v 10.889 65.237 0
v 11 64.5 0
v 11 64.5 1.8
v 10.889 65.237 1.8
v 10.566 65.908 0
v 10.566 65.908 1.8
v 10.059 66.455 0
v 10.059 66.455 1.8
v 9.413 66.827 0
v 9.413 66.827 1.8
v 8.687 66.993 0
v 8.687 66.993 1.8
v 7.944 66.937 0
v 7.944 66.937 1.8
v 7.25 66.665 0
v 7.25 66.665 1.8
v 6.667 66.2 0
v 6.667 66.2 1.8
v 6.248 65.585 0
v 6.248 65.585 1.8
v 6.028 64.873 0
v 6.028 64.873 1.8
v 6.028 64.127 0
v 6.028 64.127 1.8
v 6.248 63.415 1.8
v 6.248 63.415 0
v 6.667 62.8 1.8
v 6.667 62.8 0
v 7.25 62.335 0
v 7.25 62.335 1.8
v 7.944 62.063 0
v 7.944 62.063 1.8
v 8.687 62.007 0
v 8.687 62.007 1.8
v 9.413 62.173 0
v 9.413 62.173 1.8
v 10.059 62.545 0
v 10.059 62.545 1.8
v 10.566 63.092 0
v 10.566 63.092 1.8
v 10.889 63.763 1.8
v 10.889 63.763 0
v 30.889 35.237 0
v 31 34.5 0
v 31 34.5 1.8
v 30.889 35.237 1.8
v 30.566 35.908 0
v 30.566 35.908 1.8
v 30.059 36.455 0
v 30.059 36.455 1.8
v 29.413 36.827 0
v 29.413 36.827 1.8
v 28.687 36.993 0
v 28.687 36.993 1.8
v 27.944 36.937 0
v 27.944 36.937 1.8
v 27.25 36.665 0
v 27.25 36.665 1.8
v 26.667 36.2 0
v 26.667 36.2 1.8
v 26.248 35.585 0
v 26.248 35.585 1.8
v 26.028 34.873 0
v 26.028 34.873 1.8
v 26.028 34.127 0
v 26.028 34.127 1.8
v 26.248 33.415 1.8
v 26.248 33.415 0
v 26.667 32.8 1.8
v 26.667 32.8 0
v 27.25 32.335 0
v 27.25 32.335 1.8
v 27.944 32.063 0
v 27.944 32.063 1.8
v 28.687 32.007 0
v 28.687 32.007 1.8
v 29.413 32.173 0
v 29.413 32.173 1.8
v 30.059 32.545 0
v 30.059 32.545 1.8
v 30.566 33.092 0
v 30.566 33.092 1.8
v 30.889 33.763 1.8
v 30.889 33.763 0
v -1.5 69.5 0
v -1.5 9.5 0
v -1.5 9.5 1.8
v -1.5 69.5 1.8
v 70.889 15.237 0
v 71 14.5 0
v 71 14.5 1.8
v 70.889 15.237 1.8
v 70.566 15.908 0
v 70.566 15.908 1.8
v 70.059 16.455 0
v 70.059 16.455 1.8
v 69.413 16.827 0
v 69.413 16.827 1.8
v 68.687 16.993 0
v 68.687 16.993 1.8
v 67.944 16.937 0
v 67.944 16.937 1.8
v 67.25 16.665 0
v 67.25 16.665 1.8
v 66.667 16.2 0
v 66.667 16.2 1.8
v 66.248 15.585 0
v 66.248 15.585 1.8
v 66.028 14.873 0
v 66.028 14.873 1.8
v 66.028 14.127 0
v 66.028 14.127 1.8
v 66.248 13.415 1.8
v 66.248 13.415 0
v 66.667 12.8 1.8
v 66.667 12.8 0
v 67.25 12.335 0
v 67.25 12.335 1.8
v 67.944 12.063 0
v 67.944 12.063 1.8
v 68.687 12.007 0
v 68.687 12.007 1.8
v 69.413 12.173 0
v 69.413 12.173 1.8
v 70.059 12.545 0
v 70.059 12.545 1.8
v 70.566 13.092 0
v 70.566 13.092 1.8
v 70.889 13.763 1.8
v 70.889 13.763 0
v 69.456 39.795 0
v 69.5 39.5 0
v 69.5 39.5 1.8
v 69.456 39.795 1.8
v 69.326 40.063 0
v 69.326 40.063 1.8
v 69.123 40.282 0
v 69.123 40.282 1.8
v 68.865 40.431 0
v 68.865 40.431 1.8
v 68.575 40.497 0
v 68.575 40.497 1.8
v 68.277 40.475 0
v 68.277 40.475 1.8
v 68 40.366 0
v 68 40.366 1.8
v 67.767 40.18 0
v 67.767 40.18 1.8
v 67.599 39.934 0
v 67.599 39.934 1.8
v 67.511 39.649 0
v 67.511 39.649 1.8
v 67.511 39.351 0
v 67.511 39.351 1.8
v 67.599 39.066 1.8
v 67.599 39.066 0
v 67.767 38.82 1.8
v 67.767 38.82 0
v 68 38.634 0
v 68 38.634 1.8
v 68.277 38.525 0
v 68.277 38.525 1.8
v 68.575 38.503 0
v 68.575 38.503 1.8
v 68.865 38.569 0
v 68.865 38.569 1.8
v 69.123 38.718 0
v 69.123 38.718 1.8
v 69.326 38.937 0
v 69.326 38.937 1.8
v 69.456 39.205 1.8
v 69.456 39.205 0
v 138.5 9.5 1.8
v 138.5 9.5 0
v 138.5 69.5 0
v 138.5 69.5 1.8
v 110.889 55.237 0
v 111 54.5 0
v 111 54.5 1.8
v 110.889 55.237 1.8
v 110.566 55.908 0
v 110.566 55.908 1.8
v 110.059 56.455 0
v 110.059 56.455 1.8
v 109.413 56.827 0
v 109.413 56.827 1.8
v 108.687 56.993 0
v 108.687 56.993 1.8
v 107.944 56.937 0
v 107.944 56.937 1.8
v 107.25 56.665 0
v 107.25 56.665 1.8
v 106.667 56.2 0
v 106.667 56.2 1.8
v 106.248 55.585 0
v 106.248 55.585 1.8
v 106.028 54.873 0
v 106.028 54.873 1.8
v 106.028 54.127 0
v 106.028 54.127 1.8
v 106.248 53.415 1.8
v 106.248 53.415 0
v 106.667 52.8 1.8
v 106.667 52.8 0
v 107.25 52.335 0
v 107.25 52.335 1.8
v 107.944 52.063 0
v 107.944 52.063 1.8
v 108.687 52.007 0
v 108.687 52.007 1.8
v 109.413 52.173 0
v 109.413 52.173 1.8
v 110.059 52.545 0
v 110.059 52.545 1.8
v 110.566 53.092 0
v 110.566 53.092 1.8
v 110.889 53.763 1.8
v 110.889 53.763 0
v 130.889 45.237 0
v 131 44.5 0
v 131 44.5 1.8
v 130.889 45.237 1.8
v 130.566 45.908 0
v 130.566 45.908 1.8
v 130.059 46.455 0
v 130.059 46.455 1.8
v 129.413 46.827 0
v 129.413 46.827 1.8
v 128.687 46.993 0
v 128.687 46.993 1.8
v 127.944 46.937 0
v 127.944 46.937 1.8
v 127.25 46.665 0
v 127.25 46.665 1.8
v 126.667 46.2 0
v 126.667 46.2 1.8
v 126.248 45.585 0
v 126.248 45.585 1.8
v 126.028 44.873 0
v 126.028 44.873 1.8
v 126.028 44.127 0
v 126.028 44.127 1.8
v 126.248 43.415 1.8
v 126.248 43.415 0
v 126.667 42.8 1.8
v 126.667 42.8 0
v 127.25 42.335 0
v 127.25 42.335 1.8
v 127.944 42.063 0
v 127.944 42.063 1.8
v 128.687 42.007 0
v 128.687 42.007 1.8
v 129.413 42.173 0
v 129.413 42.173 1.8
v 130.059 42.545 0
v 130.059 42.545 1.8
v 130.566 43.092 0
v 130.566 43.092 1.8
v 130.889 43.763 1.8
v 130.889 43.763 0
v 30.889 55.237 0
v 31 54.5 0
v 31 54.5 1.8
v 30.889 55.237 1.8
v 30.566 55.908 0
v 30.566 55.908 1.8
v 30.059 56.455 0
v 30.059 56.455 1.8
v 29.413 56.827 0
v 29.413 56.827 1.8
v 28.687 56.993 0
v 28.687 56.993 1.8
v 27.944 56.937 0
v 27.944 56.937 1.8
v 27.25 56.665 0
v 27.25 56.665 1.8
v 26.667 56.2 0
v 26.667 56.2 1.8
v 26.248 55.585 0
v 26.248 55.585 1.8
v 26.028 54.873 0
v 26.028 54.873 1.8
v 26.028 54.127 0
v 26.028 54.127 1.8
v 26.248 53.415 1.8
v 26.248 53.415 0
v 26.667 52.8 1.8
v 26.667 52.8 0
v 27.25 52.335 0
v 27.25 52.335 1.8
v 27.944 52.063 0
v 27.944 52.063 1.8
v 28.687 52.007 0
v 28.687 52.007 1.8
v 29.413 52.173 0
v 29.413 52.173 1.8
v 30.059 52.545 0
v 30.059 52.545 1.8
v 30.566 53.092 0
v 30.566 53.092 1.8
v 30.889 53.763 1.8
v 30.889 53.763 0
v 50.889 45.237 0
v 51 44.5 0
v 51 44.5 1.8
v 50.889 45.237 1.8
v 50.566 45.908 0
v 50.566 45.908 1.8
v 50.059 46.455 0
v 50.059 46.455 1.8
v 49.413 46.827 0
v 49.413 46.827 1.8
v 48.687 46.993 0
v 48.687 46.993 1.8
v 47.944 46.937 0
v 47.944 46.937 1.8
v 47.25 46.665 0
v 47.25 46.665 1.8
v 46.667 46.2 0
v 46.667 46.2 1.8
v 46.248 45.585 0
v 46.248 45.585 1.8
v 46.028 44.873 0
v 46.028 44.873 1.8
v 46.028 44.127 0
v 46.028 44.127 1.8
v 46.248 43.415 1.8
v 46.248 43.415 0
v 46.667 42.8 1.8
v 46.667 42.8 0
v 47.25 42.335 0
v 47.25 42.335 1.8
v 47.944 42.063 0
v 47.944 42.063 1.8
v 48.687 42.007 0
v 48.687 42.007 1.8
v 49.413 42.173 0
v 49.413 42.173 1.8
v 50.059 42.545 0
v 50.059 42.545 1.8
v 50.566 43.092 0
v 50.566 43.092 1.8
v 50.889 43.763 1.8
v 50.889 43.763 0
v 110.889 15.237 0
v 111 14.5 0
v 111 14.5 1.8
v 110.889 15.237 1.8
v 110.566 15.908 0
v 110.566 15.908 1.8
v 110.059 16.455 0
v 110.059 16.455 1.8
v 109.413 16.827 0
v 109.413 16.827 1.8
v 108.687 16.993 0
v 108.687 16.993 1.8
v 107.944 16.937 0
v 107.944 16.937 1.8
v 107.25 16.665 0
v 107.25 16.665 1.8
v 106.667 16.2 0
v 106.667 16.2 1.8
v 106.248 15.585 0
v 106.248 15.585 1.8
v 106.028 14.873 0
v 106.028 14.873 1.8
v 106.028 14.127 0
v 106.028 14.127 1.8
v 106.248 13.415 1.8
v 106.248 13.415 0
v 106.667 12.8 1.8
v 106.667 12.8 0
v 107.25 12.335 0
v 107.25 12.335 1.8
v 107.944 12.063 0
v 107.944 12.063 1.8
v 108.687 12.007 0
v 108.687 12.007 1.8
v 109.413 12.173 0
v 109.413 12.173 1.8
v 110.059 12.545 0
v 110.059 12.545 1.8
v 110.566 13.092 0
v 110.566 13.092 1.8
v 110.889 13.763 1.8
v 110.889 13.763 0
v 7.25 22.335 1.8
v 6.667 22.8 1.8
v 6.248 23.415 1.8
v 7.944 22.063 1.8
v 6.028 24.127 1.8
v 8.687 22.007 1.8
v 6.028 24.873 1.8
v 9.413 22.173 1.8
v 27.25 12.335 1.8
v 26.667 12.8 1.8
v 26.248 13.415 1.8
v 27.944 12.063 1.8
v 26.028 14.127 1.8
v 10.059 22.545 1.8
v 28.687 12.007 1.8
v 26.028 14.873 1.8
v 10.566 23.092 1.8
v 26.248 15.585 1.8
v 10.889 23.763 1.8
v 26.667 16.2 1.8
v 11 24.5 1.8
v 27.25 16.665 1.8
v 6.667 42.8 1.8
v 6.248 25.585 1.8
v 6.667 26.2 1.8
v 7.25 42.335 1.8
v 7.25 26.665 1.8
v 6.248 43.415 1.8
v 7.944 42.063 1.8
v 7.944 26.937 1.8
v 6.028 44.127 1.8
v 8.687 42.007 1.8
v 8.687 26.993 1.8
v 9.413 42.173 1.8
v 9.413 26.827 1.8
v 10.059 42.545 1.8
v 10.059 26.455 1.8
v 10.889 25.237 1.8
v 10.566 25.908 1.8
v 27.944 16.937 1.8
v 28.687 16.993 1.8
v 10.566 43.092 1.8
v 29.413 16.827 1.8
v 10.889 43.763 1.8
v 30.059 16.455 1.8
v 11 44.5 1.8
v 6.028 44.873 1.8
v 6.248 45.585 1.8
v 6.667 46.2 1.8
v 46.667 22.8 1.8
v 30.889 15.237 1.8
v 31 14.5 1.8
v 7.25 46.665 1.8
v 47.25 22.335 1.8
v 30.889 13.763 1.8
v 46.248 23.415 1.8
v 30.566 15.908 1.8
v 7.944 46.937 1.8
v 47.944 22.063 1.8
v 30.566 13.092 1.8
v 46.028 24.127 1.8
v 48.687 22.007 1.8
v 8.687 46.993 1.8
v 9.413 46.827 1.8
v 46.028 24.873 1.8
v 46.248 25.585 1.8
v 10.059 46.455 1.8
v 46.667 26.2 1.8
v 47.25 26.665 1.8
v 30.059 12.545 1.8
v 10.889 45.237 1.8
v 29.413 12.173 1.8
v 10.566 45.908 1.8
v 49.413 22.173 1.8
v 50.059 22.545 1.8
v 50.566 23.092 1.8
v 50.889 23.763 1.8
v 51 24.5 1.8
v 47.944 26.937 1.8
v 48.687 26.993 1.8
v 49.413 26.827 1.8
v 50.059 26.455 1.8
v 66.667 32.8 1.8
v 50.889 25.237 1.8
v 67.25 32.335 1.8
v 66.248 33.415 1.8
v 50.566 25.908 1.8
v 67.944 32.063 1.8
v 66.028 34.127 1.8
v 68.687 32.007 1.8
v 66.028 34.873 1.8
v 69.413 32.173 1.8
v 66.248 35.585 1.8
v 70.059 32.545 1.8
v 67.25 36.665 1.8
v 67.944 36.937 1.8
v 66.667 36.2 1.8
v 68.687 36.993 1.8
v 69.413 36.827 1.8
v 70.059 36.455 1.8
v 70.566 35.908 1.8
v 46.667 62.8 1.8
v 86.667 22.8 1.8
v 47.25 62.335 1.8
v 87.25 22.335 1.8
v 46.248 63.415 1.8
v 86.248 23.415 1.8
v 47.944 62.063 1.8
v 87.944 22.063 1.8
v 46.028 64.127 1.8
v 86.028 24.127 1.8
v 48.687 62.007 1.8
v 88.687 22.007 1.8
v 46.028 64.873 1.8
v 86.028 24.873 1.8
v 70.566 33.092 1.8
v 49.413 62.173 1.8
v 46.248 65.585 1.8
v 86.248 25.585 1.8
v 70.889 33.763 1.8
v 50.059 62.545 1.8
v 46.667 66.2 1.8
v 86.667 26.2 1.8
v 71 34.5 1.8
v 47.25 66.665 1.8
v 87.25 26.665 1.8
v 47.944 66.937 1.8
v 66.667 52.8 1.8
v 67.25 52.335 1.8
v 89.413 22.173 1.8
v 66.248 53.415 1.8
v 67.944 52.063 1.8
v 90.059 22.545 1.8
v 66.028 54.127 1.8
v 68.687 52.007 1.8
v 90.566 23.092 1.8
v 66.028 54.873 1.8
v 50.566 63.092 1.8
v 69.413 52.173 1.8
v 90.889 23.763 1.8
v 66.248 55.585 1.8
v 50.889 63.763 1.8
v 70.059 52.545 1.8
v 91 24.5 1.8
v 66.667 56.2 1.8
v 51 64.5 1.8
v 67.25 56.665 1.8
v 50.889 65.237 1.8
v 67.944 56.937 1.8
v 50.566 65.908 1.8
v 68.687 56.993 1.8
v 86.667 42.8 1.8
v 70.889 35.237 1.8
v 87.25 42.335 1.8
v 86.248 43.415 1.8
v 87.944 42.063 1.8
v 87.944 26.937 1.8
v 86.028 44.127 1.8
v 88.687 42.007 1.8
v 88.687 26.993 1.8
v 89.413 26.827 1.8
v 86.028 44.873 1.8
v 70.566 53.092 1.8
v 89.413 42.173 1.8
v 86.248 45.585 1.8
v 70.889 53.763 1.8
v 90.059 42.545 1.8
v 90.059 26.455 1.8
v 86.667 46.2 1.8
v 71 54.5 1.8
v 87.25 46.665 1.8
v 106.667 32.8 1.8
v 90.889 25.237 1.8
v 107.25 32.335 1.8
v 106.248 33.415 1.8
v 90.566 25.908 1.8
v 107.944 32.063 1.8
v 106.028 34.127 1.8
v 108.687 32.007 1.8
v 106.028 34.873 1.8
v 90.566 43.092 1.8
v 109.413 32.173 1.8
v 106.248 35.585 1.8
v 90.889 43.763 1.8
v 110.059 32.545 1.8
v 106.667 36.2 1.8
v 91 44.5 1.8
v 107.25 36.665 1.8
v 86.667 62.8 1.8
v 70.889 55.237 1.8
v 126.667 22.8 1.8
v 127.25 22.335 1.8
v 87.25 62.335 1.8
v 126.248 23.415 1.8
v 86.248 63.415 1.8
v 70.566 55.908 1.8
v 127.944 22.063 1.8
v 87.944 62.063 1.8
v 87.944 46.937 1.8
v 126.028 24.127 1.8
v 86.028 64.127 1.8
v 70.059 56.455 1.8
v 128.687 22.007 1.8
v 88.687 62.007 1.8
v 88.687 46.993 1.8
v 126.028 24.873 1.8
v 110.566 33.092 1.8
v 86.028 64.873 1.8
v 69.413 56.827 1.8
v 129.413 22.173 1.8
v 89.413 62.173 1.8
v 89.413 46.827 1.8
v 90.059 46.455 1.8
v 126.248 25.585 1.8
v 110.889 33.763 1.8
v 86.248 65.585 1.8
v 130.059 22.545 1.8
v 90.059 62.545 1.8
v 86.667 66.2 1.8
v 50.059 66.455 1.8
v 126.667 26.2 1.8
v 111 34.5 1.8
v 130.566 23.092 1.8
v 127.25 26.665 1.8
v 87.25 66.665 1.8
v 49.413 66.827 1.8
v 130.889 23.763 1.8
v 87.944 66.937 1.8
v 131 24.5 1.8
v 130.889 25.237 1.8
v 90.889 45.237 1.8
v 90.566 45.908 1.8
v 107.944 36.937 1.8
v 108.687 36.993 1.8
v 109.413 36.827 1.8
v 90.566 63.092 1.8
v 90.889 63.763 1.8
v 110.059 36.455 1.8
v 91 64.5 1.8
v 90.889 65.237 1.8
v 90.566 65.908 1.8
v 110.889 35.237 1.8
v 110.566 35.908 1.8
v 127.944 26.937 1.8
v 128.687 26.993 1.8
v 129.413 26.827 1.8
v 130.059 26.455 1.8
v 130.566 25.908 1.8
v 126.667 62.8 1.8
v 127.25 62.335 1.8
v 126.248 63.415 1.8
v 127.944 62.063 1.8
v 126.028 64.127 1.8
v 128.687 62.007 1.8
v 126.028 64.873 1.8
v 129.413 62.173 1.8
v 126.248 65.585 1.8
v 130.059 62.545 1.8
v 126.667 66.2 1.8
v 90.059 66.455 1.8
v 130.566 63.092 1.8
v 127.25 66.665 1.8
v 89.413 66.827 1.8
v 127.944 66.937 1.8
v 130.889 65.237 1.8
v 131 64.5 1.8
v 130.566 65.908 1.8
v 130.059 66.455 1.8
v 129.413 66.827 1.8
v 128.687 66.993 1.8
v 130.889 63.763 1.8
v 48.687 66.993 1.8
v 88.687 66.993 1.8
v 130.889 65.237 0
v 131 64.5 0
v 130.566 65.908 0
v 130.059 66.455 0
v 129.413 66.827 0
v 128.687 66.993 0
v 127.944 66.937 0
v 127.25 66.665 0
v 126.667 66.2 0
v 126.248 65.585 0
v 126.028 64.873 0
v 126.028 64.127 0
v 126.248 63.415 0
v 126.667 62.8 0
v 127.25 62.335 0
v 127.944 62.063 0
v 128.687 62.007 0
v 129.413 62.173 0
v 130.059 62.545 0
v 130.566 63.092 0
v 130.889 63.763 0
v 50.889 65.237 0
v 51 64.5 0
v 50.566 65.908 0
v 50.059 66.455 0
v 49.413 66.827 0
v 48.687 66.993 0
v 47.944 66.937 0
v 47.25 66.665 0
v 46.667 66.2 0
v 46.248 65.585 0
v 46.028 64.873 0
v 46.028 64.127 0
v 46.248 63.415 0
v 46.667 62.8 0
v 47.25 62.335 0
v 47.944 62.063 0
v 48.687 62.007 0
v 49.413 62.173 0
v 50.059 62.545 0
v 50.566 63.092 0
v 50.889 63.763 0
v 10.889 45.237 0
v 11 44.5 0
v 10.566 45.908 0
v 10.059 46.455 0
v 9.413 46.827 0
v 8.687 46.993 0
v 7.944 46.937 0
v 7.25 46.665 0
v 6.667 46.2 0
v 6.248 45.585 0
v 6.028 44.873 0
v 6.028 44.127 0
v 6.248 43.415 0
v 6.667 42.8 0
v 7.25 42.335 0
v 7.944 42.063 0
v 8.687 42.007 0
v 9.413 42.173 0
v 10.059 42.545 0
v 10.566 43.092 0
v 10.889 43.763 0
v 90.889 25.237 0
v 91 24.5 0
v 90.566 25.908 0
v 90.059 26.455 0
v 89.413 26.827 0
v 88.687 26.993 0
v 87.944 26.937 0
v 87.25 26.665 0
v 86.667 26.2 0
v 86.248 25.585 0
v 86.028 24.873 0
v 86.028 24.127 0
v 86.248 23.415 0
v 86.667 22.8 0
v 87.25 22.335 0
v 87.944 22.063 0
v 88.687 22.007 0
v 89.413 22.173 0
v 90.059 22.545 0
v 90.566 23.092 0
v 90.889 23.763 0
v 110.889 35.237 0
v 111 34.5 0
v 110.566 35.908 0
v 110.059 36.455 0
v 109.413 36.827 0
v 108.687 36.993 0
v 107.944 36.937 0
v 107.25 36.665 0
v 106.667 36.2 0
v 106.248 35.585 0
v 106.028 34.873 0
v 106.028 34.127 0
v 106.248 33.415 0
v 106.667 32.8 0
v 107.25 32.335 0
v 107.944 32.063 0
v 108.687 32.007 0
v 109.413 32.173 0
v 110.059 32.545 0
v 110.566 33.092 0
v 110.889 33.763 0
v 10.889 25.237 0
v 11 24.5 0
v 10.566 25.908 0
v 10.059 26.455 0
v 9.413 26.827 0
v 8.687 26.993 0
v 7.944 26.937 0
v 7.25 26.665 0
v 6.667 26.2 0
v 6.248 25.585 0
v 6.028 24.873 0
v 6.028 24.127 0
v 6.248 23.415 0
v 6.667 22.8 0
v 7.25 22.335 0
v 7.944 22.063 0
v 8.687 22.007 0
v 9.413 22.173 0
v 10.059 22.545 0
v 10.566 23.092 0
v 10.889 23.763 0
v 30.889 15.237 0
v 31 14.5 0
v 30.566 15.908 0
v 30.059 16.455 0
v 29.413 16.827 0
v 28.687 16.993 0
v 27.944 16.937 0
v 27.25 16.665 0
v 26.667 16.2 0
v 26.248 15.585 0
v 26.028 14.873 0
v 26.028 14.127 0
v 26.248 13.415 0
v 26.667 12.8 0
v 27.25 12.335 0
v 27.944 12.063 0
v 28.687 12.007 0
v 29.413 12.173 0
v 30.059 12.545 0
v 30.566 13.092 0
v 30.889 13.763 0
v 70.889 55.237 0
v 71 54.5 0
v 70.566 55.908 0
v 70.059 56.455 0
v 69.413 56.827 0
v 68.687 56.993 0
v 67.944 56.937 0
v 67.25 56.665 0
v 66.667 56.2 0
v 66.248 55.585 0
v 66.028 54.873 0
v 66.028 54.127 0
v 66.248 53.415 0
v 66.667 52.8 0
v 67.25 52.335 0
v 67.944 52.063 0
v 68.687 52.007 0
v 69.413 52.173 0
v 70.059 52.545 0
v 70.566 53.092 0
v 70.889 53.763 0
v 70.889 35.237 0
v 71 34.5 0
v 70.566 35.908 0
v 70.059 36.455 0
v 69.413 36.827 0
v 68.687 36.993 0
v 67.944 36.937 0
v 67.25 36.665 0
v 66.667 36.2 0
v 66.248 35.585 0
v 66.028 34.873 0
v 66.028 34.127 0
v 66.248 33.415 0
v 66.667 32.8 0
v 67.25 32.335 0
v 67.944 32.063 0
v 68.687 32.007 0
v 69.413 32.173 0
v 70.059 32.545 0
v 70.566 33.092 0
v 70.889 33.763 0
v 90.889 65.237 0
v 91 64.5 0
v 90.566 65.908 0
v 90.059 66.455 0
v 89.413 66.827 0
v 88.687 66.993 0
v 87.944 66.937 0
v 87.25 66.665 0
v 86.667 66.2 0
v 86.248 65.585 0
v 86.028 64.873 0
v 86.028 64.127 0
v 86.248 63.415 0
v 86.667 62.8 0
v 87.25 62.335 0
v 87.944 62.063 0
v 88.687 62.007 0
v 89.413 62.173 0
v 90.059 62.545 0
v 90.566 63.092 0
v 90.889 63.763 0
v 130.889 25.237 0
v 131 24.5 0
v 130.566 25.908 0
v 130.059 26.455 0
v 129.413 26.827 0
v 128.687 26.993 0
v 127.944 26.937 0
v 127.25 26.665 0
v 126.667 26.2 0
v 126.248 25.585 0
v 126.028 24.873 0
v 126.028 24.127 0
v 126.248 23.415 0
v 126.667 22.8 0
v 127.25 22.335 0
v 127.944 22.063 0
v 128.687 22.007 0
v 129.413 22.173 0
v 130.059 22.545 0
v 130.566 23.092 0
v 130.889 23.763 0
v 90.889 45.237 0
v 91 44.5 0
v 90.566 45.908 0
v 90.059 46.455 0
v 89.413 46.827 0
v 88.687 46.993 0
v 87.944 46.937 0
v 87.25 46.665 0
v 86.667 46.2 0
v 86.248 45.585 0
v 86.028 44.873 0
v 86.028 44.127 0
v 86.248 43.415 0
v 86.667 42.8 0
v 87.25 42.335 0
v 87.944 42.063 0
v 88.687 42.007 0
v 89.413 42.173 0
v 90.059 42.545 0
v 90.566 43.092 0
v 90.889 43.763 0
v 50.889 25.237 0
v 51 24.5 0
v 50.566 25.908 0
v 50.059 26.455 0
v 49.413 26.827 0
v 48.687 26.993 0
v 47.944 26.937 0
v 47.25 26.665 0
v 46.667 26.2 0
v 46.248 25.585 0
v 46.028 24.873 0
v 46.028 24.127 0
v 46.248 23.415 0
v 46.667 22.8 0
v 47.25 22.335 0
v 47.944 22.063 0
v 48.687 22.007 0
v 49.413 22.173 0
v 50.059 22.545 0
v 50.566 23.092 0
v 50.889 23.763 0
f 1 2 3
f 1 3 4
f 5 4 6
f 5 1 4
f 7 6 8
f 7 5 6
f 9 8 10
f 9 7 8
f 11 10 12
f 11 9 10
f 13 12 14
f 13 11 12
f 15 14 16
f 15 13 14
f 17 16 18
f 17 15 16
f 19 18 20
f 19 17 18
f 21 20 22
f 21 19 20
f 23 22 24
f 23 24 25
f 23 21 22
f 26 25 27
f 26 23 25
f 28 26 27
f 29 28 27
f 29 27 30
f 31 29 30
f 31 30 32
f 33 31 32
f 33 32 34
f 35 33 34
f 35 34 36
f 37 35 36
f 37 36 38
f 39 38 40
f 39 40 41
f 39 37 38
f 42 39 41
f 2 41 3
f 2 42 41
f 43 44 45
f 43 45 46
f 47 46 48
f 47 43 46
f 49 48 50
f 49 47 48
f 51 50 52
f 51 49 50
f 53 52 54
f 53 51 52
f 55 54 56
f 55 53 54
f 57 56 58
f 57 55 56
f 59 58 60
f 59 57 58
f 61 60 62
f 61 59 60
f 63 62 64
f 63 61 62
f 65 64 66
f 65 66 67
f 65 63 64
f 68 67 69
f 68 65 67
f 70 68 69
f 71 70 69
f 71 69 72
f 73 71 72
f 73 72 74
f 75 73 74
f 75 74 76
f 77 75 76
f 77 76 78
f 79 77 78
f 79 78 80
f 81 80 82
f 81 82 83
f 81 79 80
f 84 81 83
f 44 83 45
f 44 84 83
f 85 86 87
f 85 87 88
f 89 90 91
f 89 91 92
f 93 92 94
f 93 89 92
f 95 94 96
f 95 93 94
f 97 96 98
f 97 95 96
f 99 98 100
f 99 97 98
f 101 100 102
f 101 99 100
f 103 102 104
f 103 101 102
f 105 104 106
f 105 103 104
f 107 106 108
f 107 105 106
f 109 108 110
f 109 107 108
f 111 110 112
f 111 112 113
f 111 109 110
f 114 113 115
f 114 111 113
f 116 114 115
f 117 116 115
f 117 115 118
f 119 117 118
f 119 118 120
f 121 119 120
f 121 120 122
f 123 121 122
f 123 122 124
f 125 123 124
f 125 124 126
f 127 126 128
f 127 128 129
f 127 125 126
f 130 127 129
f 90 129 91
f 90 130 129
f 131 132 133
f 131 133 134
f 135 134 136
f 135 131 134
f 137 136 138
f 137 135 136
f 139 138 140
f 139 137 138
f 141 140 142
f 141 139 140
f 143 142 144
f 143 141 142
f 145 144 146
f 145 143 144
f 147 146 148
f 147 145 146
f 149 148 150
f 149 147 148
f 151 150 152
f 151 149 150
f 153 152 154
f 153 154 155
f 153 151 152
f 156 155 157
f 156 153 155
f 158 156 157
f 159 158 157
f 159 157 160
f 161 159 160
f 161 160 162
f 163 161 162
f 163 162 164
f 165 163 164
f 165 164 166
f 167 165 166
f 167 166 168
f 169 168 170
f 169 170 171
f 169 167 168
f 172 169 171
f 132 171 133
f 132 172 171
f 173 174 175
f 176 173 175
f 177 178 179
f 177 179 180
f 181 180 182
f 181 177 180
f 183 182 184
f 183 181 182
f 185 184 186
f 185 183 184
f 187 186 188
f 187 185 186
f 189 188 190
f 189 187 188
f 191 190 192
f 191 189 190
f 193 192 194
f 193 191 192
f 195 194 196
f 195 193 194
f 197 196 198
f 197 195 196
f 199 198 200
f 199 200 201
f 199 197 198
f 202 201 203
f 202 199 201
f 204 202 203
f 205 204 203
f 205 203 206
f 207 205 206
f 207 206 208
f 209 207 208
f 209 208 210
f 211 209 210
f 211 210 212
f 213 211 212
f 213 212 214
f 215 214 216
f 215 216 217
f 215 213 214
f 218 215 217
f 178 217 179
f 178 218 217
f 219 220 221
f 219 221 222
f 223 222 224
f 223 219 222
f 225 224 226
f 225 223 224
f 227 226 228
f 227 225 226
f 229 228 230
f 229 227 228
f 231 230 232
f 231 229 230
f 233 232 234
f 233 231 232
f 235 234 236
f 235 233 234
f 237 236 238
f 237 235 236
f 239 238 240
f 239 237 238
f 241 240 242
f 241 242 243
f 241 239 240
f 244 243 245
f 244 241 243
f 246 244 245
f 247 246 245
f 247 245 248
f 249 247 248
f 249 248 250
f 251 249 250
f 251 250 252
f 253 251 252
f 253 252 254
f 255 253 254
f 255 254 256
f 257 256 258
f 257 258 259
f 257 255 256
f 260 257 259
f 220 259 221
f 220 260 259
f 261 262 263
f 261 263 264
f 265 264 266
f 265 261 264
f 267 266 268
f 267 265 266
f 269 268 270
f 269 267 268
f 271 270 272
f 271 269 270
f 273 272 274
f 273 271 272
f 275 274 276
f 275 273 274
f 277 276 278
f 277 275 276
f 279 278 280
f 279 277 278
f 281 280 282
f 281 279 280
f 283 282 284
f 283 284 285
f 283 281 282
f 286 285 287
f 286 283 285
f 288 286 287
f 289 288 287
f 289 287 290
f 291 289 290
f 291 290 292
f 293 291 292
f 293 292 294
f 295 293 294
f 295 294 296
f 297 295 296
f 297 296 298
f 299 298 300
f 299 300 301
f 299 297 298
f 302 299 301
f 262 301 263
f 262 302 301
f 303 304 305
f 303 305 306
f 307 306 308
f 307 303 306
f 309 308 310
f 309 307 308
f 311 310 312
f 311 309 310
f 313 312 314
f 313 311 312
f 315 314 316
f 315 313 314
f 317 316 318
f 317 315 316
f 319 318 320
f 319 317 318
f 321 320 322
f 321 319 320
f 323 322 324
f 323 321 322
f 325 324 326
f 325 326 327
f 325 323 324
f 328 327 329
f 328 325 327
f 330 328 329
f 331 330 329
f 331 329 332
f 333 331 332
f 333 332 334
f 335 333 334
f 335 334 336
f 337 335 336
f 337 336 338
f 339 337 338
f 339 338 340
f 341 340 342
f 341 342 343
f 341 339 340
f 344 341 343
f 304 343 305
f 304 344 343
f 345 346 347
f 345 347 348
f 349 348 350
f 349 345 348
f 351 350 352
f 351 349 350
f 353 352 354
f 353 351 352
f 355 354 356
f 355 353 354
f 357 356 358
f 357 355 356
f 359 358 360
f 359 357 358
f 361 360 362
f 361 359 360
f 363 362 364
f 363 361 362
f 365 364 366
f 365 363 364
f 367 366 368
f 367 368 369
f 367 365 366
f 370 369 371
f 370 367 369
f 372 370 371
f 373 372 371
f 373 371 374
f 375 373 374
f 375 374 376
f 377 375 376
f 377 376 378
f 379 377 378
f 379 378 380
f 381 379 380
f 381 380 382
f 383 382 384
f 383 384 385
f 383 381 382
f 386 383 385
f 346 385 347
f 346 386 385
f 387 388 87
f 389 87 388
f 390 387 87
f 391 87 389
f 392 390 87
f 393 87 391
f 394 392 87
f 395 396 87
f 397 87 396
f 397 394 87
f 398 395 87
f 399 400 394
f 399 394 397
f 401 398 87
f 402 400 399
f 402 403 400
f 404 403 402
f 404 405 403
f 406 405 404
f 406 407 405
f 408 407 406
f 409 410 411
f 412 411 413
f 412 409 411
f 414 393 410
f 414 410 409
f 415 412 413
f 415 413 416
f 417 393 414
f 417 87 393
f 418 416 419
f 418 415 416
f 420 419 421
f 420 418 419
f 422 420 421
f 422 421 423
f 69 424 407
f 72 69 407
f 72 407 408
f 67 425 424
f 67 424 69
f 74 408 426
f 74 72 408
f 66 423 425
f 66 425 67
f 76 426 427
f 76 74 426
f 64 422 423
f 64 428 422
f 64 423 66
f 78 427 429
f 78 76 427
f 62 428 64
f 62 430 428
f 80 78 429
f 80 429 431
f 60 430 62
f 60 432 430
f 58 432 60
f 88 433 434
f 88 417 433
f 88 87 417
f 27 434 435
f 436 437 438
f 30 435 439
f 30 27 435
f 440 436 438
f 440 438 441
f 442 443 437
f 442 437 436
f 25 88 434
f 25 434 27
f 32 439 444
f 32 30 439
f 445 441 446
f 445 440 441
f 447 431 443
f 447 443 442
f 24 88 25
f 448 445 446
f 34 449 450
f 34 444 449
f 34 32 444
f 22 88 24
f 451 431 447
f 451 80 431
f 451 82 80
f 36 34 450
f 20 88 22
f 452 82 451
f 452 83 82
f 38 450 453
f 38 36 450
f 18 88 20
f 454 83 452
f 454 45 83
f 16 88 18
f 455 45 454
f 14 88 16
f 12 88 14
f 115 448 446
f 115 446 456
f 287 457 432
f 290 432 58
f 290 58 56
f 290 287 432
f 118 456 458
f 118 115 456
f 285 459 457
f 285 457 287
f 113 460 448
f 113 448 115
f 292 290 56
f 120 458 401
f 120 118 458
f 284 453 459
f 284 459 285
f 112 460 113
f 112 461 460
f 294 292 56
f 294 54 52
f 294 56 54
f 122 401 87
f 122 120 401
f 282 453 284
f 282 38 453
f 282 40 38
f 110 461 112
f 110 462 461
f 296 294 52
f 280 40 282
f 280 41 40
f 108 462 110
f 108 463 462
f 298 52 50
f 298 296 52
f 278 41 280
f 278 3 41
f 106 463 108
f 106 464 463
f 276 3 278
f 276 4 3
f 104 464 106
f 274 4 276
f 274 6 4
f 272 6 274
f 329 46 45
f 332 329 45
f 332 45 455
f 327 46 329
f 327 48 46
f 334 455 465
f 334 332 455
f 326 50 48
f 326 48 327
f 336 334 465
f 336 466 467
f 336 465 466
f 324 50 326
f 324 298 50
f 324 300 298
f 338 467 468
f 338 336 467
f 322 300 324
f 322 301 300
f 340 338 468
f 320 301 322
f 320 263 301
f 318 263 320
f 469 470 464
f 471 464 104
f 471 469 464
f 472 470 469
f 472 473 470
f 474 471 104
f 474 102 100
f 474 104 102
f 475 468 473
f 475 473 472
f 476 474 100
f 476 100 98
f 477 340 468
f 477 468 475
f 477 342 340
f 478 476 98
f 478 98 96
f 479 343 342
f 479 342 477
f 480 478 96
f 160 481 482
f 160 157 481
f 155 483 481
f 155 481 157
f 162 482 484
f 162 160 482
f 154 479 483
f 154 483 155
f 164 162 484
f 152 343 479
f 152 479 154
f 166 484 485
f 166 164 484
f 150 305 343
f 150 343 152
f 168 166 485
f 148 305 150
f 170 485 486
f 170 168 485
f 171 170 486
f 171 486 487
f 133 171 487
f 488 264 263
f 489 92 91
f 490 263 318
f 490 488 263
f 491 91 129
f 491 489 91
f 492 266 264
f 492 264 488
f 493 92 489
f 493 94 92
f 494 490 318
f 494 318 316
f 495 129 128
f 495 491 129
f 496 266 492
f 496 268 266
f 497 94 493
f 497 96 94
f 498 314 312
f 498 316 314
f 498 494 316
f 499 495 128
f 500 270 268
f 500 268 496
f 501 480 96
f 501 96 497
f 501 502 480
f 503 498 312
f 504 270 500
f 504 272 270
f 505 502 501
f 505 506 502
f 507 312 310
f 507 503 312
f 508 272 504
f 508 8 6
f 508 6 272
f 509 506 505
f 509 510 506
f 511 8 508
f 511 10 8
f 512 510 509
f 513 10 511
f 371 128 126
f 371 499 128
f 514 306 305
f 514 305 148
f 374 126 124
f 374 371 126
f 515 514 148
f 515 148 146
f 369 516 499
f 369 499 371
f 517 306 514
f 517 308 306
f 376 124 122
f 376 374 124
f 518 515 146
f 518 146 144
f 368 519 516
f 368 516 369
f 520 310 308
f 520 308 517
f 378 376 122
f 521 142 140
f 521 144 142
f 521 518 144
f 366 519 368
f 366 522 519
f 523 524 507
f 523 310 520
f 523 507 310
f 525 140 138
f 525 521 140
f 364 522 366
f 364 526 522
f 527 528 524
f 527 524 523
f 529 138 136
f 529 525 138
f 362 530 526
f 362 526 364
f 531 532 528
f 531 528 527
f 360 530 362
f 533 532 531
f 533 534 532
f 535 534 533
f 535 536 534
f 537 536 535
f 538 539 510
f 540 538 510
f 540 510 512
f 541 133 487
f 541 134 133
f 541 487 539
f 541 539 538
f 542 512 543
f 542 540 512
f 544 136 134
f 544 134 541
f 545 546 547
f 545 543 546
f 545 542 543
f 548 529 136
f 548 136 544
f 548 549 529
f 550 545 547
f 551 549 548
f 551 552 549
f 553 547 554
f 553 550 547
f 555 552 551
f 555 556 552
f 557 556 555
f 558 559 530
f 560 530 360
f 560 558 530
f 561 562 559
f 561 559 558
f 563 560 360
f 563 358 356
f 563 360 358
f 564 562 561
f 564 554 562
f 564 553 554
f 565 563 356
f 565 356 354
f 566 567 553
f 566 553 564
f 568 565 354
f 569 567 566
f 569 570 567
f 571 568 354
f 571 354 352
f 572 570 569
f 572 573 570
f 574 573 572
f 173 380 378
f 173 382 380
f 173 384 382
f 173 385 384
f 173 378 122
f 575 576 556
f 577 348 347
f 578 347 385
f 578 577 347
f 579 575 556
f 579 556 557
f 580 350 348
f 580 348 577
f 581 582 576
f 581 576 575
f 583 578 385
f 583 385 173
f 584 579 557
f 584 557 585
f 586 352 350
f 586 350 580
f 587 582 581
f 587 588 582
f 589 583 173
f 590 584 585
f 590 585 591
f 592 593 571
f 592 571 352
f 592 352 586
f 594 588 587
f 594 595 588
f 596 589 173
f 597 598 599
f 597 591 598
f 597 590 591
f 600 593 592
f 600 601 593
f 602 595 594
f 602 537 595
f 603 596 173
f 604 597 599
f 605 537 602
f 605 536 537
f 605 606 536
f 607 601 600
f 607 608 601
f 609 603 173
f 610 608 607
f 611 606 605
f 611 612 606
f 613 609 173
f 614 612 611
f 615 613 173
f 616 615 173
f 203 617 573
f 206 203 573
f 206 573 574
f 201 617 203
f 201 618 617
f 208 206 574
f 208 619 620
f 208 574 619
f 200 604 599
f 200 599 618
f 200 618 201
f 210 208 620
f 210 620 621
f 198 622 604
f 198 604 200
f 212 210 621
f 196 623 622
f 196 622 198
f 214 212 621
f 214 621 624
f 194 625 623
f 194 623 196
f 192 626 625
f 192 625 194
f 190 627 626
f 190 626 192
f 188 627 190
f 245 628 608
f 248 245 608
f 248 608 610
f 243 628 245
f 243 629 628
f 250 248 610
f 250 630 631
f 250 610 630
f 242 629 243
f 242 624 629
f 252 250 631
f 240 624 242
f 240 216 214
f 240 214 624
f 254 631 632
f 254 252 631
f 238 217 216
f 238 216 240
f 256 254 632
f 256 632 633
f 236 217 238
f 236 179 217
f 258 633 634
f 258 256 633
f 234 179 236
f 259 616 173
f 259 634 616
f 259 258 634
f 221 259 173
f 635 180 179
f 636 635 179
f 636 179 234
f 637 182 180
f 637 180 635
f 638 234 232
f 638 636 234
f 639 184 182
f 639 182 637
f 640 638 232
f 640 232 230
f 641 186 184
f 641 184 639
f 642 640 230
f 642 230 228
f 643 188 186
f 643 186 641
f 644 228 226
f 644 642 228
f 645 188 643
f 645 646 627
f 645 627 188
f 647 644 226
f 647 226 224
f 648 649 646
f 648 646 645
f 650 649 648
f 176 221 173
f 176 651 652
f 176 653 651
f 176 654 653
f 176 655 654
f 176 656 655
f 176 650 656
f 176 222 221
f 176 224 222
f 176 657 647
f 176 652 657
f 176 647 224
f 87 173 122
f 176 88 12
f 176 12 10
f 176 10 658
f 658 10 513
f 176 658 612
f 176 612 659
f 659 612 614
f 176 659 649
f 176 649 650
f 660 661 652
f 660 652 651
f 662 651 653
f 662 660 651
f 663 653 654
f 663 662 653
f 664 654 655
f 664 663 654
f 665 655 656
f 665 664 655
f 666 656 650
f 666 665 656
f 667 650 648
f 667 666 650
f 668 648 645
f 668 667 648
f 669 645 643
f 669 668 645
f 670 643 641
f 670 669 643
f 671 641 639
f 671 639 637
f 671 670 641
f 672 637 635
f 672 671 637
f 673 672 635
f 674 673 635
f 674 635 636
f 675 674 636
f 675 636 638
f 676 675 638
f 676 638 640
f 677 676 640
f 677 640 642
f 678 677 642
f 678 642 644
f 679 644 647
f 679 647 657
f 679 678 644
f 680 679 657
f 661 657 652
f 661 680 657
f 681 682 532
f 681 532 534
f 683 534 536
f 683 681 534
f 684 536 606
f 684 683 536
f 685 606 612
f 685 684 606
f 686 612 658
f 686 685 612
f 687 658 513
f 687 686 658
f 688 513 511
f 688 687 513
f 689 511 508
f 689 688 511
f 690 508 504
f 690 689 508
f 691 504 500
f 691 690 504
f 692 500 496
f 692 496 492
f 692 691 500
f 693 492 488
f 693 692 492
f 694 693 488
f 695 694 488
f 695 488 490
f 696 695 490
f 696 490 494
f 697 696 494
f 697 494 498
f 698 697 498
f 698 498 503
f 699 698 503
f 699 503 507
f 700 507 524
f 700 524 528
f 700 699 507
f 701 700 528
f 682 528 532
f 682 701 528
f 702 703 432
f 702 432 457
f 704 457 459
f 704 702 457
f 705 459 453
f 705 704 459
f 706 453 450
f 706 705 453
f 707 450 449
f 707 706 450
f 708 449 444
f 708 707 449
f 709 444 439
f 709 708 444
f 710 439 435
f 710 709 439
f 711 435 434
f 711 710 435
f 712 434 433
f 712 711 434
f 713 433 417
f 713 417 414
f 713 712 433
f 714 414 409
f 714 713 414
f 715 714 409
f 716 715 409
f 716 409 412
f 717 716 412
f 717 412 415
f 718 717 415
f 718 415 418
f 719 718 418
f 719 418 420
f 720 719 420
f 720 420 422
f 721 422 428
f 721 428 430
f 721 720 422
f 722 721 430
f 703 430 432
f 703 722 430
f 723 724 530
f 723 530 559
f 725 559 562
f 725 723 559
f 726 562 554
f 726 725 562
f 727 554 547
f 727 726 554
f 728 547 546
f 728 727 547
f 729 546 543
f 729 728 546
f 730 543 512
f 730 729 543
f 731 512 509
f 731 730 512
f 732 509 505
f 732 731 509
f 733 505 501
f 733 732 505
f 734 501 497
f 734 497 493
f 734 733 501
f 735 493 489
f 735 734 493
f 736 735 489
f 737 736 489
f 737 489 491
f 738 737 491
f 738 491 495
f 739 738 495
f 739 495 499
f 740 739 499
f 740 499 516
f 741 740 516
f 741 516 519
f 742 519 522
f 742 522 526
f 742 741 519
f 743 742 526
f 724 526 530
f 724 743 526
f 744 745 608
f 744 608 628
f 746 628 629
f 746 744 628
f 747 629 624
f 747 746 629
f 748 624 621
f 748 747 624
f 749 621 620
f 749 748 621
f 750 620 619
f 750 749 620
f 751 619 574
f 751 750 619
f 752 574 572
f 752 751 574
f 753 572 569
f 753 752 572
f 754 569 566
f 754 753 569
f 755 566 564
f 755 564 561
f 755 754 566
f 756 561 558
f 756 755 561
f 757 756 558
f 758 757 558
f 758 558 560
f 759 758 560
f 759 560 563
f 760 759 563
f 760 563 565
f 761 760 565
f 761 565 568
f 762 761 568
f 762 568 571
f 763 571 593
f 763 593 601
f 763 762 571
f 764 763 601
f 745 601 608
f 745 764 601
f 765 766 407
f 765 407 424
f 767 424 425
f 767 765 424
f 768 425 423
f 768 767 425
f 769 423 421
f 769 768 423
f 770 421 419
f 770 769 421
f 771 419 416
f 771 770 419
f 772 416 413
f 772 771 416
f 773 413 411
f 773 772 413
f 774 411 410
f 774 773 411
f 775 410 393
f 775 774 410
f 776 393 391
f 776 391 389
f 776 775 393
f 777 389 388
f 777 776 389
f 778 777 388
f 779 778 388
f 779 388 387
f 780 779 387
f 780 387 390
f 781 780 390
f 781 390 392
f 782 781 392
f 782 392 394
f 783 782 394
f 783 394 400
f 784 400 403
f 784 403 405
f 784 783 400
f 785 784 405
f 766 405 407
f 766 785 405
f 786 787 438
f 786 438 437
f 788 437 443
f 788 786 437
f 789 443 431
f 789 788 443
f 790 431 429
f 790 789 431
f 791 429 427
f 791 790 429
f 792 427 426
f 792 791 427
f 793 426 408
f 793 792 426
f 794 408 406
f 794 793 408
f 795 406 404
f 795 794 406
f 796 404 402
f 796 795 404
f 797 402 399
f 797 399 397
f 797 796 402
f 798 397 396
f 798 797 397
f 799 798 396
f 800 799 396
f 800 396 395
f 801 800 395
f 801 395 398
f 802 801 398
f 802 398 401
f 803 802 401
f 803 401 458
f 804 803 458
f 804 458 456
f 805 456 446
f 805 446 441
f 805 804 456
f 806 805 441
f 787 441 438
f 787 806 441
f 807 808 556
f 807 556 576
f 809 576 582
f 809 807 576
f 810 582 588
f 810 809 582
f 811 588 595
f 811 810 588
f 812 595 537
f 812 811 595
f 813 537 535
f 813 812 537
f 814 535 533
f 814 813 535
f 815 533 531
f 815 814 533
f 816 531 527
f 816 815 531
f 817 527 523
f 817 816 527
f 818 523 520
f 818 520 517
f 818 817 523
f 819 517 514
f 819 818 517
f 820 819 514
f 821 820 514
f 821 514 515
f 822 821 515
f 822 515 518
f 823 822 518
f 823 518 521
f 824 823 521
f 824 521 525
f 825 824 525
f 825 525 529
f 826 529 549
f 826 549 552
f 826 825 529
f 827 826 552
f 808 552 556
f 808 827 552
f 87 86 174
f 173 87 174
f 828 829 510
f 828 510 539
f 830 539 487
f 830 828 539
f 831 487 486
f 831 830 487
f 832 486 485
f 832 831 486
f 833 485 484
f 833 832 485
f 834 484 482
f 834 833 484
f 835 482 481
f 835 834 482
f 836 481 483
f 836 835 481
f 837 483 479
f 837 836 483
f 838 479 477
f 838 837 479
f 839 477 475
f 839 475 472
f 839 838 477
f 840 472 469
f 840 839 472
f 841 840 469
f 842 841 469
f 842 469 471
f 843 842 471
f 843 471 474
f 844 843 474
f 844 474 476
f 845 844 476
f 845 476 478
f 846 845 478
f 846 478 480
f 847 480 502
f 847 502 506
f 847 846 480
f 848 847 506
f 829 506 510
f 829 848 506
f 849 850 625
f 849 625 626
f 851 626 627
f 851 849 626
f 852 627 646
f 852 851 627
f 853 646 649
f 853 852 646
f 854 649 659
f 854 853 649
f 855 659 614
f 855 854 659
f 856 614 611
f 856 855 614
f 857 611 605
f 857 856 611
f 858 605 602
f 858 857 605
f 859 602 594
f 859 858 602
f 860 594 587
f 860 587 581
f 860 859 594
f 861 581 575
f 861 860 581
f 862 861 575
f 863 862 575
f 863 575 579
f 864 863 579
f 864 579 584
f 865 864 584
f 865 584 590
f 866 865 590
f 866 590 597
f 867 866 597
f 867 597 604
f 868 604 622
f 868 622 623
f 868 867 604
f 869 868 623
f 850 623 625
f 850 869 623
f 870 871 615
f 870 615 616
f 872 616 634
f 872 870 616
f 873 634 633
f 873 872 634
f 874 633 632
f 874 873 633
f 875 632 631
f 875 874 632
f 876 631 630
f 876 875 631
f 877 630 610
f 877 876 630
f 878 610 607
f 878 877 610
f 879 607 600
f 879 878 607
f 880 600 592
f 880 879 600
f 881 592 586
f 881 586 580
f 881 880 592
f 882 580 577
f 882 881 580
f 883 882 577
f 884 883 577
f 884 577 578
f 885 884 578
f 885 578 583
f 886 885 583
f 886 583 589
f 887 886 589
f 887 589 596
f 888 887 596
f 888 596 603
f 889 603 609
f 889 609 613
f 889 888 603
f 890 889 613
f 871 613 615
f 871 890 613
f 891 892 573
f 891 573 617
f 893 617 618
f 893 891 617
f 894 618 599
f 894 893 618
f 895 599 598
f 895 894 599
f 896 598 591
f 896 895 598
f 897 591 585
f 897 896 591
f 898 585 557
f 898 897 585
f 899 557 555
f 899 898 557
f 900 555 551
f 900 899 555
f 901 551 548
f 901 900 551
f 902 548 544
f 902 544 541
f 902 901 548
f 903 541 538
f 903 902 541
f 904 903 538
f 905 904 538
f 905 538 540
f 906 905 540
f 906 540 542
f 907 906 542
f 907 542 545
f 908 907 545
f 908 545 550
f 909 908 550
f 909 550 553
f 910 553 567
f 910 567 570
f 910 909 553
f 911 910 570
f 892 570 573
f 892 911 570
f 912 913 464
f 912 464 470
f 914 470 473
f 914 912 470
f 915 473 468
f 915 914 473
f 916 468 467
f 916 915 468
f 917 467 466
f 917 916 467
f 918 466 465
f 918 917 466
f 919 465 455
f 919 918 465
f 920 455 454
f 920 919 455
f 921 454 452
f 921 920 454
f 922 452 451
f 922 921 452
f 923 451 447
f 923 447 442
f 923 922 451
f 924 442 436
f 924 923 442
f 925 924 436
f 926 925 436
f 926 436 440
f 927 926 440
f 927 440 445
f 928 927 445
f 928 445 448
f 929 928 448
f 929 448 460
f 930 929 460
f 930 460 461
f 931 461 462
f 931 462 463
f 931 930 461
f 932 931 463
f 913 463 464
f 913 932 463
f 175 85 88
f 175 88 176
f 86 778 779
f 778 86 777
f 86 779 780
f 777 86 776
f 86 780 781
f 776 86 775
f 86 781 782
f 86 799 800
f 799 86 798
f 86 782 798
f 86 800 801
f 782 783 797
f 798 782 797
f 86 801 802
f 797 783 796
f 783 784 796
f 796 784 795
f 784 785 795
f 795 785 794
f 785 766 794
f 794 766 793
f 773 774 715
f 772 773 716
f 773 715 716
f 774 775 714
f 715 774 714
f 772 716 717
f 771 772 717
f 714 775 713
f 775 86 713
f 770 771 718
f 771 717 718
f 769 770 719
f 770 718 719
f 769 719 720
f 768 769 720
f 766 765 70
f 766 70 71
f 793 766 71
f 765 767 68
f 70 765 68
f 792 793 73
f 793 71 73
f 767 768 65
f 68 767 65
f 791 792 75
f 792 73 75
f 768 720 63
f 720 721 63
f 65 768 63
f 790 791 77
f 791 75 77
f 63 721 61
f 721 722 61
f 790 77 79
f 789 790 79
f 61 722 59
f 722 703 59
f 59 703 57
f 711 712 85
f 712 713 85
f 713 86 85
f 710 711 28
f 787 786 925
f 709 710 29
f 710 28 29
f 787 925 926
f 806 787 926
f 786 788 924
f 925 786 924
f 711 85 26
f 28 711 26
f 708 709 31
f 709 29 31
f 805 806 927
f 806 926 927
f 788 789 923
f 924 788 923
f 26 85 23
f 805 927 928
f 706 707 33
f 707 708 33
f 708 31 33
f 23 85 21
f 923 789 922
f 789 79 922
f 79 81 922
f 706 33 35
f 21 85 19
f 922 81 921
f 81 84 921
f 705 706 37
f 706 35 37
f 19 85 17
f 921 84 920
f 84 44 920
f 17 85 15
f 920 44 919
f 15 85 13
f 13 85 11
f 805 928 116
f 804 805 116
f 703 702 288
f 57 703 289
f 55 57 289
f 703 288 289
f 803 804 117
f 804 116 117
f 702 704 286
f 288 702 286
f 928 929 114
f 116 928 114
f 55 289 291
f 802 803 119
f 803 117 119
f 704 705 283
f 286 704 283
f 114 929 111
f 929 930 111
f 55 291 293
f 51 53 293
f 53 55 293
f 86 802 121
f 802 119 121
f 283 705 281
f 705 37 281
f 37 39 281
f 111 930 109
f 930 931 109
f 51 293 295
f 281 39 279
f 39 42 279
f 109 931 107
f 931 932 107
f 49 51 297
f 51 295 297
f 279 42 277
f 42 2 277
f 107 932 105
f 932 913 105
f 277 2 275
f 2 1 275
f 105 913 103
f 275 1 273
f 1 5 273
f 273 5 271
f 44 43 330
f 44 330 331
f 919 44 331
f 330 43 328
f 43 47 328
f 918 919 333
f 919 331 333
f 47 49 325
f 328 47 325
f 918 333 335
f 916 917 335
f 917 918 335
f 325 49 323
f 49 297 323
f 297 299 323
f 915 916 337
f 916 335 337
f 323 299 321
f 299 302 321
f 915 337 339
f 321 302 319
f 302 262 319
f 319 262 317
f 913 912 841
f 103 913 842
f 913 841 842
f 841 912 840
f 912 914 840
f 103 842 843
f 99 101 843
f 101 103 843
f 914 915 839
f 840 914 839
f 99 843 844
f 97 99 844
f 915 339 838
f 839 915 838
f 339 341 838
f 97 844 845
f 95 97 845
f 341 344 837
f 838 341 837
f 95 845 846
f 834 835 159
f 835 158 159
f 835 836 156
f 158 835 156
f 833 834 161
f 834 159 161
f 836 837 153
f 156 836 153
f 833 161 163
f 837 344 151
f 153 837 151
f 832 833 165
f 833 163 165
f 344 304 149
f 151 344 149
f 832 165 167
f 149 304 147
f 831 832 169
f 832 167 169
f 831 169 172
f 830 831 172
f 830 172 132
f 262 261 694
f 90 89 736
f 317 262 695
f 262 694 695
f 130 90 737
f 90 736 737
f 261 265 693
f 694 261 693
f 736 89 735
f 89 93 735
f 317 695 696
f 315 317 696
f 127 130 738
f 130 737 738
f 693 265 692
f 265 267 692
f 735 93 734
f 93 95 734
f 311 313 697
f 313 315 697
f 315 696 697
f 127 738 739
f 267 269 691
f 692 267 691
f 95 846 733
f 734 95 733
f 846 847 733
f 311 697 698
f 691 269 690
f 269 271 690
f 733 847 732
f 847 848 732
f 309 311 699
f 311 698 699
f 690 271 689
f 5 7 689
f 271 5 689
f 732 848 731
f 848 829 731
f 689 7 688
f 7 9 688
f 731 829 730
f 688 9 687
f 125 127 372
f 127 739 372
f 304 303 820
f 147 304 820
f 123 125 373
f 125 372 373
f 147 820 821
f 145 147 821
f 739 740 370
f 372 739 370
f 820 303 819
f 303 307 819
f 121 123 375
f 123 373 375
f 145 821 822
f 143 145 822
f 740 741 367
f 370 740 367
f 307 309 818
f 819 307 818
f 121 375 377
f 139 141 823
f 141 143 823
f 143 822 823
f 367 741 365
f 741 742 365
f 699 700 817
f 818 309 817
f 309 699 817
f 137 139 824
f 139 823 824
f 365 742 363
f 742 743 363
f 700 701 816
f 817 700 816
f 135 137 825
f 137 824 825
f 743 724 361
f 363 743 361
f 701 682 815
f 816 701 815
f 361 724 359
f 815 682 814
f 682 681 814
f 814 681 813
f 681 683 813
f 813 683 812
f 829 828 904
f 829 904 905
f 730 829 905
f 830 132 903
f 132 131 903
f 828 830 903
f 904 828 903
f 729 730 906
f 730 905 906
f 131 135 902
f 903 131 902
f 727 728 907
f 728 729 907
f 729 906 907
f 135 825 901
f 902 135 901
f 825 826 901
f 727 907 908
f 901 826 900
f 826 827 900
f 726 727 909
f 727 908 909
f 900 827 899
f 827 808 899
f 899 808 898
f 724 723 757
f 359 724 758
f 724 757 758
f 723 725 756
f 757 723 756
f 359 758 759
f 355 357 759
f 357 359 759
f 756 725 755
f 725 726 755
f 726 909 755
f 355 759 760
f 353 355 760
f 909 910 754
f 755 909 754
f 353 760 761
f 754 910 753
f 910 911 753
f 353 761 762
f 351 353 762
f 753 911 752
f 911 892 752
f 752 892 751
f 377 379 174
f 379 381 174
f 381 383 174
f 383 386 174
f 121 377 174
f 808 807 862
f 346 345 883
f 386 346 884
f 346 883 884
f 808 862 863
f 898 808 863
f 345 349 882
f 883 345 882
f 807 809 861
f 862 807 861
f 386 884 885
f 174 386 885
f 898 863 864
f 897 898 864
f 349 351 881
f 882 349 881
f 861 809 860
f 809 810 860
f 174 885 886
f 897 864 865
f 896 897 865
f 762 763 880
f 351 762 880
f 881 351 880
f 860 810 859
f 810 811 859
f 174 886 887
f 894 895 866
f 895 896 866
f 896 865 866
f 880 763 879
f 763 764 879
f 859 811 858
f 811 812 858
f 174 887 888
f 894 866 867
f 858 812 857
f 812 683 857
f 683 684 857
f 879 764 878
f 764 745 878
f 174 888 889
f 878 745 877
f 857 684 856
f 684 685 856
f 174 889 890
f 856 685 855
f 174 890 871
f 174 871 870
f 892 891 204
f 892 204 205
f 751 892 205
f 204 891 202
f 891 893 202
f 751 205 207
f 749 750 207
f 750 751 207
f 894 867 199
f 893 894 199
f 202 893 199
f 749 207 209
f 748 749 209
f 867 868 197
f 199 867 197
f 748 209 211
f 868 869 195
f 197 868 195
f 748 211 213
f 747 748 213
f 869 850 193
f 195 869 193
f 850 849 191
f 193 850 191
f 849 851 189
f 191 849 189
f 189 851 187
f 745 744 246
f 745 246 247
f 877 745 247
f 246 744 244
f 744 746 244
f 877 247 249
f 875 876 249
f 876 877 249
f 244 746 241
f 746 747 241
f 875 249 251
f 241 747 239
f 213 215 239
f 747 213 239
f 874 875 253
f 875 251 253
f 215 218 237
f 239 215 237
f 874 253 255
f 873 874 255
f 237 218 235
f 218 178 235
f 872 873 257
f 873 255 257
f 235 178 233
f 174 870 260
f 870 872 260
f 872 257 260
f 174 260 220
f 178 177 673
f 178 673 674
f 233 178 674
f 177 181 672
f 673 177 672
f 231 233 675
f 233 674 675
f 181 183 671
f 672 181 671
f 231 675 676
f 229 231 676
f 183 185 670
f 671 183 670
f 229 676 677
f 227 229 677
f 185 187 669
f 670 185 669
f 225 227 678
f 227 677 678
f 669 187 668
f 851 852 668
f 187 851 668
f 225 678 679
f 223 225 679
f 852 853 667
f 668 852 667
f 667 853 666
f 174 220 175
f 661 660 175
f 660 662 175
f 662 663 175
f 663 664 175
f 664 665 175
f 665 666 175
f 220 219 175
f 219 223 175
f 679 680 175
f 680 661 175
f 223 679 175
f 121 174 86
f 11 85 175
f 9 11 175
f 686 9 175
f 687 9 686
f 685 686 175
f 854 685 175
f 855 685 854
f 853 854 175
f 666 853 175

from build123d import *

# Parameters (mm, degrees)
SKETCH_W   = 140
SKETCH_H   = 60
SKETCH_R   = 2.5
SKETCH_R_2 = 1
PAD_DEPTH  = 1.8


with BuildPart() as part:
    # Sketch → Pad (new body)
    with BuildSketch(Plane.XY):
        with Locations((68.5, 39.5)):
            Rectangle(SKETCH_W, SKETCH_H)
        with Locations((28.5, 14.5)):
            Circle(SKETCH_R, mode=Mode.SUBTRACT)
        with Locations((108.5, 14.5)):
            Circle(SKETCH_R, mode=Mode.SUBTRACT)
        with Locations((8.5, 24.5)):
            Circle(SKETCH_R, mode=Mode.SUBTRACT)
        with Locations((48.5, 24.5)):
            Circle(SKETCH_R, mode=Mode.SUBTRACT)
        with Locations((88.5, 24.5)):
            Circle(SKETCH_R, mode=Mode.SUBTRACT)
        with Locations((8.5, 44.5)):
            Circle(SKETCH_R, mode=Mode.SUBTRACT)
        with Locations((48.5, 44.5)):
            Circle(SKETCH_R, mode=Mode.SUBTRACT)
        with Locations((88.5, 44.5)):
            Circle(SKETCH_R, mode=Mode.SUBTRACT)
        with Locations((28.5, 54.5)):
            Circle(SKETCH_R, mode=Mode.SUBTRACT)
        with Locations((68.5, 54.5)):
            Circle(SKETCH_R, mode=Mode.SUBTRACT)
        with Locations((108.5, 54.5)):
            Circle(SKETCH_R, mode=Mode.SUBTRACT)
        with Locations((88.5, 64.5)):
            Circle(SKETCH_R, mode=Mode.SUBTRACT)
        with Locations((48.5, 64.5)):
            Circle(SKETCH_R, mode=Mode.SUBTRACT)
        with Locations((8.5, 64.5)):
            Circle(SKETCH_R, mode=Mode.SUBTRACT)
        with Locations((28.5, 34.5)):
            Circle(SKETCH_R, mode=Mode.SUBTRACT)
        with Locations((68.5, 34.5)):
            Circle(SKETCH_R, mode=Mode.SUBTRACT)
        with Locations((108.5, 34.5)):
            Circle(SKETCH_R, mode=Mode.SUBTRACT)
        with Locations((68.5, 14.5)):
            Circle(SKETCH_R, mode=Mode.SUBTRACT)
        with Locations((128.5, 24.5)):
            Circle(SKETCH_R, mode=Mode.SUBTRACT)
        with Locations((128.5, 44.5)):
            Circle(SKETCH_R, mode=Mode.SUBTRACT)
        with Locations((128.5, 64.5)):
            Circle(SKETCH_R, mode=Mode.SUBTRACT)
        with Locations((68.5, 39.5)):
            Circle(SKETCH_R_2, mode=Mode.SUBTRACT)
    extrude(amount=PAD_DEPTH)


solid = part.part
